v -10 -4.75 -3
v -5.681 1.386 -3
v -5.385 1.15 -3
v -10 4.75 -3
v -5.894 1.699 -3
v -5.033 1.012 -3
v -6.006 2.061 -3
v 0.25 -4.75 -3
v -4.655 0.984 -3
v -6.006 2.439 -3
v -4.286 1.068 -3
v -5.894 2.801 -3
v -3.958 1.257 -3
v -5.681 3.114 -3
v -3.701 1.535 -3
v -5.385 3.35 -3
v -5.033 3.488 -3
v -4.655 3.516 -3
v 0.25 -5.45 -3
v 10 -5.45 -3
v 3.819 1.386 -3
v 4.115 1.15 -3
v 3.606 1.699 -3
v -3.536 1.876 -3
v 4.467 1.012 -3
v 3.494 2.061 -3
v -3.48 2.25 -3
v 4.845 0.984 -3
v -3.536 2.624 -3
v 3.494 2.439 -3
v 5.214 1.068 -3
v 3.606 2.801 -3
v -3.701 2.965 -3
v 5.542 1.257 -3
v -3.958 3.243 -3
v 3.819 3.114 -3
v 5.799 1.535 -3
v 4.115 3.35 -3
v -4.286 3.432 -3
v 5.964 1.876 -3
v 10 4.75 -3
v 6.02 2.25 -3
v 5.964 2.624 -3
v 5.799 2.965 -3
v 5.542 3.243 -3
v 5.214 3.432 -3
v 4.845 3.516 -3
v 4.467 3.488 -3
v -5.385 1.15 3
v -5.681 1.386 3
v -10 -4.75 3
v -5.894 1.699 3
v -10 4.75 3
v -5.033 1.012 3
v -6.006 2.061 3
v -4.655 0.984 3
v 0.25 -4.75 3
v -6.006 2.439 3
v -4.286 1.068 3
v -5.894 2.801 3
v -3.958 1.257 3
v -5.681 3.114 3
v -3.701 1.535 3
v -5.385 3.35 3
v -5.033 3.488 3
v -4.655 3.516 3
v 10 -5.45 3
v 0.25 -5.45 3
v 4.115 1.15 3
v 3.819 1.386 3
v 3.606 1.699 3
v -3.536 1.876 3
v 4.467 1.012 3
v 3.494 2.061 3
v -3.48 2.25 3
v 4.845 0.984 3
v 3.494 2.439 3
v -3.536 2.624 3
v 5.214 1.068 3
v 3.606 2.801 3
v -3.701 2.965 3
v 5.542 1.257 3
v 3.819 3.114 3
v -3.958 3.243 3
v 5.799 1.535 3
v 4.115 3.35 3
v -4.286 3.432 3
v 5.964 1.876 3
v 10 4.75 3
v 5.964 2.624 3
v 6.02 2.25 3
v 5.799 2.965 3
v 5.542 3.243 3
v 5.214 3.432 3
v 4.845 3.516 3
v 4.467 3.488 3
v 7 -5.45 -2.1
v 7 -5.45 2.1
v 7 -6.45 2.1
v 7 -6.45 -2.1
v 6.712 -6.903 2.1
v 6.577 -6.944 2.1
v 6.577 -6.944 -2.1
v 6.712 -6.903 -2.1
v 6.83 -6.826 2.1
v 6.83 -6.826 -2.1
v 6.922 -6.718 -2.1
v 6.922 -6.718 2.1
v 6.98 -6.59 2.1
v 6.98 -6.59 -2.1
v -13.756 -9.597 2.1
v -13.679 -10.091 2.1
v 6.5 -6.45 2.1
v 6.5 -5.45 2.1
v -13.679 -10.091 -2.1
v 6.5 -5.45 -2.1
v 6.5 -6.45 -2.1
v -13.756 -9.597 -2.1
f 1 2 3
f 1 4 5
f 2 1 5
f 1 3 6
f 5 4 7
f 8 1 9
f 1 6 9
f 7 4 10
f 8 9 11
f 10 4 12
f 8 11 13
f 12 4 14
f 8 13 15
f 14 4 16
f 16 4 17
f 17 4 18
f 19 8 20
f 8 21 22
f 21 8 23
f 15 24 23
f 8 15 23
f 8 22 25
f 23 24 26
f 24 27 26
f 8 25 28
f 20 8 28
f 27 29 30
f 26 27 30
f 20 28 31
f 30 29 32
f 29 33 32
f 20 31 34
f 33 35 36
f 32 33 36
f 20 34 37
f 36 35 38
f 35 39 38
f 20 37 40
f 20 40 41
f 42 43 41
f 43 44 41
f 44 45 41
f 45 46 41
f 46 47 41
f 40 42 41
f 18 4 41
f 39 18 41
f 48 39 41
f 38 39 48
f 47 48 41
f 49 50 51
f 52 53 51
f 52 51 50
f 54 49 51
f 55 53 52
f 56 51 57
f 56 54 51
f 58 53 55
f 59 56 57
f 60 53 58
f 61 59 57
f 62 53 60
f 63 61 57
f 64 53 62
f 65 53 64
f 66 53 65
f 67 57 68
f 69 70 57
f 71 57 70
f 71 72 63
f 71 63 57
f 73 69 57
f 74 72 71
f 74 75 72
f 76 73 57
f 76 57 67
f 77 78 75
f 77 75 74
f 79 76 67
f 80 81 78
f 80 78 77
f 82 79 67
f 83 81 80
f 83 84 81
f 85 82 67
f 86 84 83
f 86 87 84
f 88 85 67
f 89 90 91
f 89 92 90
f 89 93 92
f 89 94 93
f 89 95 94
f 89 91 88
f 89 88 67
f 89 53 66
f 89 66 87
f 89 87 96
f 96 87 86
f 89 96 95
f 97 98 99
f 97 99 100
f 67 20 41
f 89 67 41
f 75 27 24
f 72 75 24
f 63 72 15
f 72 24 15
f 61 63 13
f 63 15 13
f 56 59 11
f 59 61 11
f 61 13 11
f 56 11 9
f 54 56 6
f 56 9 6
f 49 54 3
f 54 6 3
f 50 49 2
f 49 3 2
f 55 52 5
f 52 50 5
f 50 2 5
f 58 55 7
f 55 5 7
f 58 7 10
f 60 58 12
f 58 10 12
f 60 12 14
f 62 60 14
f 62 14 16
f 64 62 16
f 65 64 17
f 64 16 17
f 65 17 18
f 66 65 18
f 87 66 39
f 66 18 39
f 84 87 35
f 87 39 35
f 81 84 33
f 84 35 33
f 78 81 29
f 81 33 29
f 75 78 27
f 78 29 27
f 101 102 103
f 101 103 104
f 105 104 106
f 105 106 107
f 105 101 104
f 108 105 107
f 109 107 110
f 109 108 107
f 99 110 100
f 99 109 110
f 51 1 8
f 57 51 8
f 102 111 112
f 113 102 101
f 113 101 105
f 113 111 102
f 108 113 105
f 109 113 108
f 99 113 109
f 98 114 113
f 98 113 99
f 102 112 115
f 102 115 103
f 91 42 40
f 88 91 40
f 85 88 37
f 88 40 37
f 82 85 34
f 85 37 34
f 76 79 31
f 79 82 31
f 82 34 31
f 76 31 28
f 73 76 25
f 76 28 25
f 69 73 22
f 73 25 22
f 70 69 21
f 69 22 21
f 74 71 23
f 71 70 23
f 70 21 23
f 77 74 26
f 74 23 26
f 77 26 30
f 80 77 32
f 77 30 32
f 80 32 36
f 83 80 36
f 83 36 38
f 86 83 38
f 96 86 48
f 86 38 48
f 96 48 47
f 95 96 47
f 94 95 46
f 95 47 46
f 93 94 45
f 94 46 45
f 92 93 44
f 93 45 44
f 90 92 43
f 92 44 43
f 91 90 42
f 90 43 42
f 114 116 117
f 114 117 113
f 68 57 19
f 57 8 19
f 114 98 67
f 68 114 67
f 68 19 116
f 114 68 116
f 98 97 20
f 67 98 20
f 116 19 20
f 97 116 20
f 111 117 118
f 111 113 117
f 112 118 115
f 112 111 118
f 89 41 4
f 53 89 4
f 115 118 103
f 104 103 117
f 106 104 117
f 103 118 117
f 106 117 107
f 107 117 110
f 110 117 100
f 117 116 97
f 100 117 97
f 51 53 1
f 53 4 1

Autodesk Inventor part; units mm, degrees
ref_plane "YZ Plane" through (0, 0, 0) normal (1, 0, 0) x (0, 1, 0)
ref_plane "XZ Plane" through (0, 0, 0) normal (0, 1, 0) x (-1, 0, 0)
ref_plane "XY Plane" through (0, 0, 0) normal (0, 0, 1) x (1, 0, 0)
sketch "Sketch1" plane through (0, 0, 0) normal (0, 0, 1) x (1, 0, 0)
  line L0 (10, 4.75) -> (-10, 4.75)
  line L1 (-10, 4.75) -> (-10, -4.75)
  line L2 (-10, -4.75) -> (10, -4.75)
  line L3 (10, -4.75) -> (10, 4.75)
  line L4 (0.25, -4.75) -> (0.25, -5.45)
  line L5 (0.25, -5.45) -> (10, -5.45)
  line L6 (10, -5.45) -> (10, -4.75)
  line L7 (-10, -4.75) -> (10, 4.75) construction
  line L8 (10, -4.75) -> (-10, 4.75) construction
  circle A0 centre (-4.75, 2.25) radius 1.27
  circle A1 centre (4.75, 2.25) radius 1.27
  line L9 (0, 0) -> (0, 4.75) construction
  dimension "d0" = 20
  dimension "d2" = 10.2
  dimension "d3" = 9.5
  dimension "d4" = 9.75
  dimension "d5" = 9.5
  dimension "d6" = 2.54
  dimension "d7" = 2.5
extrude "Extrusion1" add sketch "Sketch1" along normal mid plane 6
sketch "Sketch2" plane through (0.25, -5.45, -3) normal (0, -1, 0) x (1, 0, 0)
  line L0 (6.75, 0.9) -> (6.25, 0.9)
  line L1 (6.25, 0.9) -> (6.25, 5.1)
  line L2 (6.25, 5.1) -> (6.75, 5.1)
  line L3 (6.75, 5.1) -> (6.75, 0.9)
  line L4 (-14.25, 3) -> (13.75, 3) projected
  line L5 (9.75, 0) -> (9.75, 6) projected
  point P0 (-0.25, 3)
  dimension "d10" = 4.2
  dimension "d11" = 0.5
  dimension "d12" = 3
extrude "Extrusion2" add sketch "Sketch2" along normal blind 1
sketch "Sketch3" plane through (6.5, -5.45, 2.1) normal (0, 0, 1) x (1, 0, 0)
  line L0 (0, -1) -> (-20.256, -4.1472)
  line L1 (-20.256, -4.1472) -> (-20.1793, -4.6413)
  line L2 (-20.1793, -4.6413) -> (0.0768, -1.4941)
  arc A0 (0.0768, -1.4941) -> (0.5, -1) centre (0, -1) ccw
  line L3 (0.5, -1) -> (0, -1) projected
  point P0 (-6.5, 5.45)
  dimension "d15" = 0.5
extrude "Extrusion3" add sketch "Sketch3" against normal blind 4.2
properties part number "Limit Switch"
